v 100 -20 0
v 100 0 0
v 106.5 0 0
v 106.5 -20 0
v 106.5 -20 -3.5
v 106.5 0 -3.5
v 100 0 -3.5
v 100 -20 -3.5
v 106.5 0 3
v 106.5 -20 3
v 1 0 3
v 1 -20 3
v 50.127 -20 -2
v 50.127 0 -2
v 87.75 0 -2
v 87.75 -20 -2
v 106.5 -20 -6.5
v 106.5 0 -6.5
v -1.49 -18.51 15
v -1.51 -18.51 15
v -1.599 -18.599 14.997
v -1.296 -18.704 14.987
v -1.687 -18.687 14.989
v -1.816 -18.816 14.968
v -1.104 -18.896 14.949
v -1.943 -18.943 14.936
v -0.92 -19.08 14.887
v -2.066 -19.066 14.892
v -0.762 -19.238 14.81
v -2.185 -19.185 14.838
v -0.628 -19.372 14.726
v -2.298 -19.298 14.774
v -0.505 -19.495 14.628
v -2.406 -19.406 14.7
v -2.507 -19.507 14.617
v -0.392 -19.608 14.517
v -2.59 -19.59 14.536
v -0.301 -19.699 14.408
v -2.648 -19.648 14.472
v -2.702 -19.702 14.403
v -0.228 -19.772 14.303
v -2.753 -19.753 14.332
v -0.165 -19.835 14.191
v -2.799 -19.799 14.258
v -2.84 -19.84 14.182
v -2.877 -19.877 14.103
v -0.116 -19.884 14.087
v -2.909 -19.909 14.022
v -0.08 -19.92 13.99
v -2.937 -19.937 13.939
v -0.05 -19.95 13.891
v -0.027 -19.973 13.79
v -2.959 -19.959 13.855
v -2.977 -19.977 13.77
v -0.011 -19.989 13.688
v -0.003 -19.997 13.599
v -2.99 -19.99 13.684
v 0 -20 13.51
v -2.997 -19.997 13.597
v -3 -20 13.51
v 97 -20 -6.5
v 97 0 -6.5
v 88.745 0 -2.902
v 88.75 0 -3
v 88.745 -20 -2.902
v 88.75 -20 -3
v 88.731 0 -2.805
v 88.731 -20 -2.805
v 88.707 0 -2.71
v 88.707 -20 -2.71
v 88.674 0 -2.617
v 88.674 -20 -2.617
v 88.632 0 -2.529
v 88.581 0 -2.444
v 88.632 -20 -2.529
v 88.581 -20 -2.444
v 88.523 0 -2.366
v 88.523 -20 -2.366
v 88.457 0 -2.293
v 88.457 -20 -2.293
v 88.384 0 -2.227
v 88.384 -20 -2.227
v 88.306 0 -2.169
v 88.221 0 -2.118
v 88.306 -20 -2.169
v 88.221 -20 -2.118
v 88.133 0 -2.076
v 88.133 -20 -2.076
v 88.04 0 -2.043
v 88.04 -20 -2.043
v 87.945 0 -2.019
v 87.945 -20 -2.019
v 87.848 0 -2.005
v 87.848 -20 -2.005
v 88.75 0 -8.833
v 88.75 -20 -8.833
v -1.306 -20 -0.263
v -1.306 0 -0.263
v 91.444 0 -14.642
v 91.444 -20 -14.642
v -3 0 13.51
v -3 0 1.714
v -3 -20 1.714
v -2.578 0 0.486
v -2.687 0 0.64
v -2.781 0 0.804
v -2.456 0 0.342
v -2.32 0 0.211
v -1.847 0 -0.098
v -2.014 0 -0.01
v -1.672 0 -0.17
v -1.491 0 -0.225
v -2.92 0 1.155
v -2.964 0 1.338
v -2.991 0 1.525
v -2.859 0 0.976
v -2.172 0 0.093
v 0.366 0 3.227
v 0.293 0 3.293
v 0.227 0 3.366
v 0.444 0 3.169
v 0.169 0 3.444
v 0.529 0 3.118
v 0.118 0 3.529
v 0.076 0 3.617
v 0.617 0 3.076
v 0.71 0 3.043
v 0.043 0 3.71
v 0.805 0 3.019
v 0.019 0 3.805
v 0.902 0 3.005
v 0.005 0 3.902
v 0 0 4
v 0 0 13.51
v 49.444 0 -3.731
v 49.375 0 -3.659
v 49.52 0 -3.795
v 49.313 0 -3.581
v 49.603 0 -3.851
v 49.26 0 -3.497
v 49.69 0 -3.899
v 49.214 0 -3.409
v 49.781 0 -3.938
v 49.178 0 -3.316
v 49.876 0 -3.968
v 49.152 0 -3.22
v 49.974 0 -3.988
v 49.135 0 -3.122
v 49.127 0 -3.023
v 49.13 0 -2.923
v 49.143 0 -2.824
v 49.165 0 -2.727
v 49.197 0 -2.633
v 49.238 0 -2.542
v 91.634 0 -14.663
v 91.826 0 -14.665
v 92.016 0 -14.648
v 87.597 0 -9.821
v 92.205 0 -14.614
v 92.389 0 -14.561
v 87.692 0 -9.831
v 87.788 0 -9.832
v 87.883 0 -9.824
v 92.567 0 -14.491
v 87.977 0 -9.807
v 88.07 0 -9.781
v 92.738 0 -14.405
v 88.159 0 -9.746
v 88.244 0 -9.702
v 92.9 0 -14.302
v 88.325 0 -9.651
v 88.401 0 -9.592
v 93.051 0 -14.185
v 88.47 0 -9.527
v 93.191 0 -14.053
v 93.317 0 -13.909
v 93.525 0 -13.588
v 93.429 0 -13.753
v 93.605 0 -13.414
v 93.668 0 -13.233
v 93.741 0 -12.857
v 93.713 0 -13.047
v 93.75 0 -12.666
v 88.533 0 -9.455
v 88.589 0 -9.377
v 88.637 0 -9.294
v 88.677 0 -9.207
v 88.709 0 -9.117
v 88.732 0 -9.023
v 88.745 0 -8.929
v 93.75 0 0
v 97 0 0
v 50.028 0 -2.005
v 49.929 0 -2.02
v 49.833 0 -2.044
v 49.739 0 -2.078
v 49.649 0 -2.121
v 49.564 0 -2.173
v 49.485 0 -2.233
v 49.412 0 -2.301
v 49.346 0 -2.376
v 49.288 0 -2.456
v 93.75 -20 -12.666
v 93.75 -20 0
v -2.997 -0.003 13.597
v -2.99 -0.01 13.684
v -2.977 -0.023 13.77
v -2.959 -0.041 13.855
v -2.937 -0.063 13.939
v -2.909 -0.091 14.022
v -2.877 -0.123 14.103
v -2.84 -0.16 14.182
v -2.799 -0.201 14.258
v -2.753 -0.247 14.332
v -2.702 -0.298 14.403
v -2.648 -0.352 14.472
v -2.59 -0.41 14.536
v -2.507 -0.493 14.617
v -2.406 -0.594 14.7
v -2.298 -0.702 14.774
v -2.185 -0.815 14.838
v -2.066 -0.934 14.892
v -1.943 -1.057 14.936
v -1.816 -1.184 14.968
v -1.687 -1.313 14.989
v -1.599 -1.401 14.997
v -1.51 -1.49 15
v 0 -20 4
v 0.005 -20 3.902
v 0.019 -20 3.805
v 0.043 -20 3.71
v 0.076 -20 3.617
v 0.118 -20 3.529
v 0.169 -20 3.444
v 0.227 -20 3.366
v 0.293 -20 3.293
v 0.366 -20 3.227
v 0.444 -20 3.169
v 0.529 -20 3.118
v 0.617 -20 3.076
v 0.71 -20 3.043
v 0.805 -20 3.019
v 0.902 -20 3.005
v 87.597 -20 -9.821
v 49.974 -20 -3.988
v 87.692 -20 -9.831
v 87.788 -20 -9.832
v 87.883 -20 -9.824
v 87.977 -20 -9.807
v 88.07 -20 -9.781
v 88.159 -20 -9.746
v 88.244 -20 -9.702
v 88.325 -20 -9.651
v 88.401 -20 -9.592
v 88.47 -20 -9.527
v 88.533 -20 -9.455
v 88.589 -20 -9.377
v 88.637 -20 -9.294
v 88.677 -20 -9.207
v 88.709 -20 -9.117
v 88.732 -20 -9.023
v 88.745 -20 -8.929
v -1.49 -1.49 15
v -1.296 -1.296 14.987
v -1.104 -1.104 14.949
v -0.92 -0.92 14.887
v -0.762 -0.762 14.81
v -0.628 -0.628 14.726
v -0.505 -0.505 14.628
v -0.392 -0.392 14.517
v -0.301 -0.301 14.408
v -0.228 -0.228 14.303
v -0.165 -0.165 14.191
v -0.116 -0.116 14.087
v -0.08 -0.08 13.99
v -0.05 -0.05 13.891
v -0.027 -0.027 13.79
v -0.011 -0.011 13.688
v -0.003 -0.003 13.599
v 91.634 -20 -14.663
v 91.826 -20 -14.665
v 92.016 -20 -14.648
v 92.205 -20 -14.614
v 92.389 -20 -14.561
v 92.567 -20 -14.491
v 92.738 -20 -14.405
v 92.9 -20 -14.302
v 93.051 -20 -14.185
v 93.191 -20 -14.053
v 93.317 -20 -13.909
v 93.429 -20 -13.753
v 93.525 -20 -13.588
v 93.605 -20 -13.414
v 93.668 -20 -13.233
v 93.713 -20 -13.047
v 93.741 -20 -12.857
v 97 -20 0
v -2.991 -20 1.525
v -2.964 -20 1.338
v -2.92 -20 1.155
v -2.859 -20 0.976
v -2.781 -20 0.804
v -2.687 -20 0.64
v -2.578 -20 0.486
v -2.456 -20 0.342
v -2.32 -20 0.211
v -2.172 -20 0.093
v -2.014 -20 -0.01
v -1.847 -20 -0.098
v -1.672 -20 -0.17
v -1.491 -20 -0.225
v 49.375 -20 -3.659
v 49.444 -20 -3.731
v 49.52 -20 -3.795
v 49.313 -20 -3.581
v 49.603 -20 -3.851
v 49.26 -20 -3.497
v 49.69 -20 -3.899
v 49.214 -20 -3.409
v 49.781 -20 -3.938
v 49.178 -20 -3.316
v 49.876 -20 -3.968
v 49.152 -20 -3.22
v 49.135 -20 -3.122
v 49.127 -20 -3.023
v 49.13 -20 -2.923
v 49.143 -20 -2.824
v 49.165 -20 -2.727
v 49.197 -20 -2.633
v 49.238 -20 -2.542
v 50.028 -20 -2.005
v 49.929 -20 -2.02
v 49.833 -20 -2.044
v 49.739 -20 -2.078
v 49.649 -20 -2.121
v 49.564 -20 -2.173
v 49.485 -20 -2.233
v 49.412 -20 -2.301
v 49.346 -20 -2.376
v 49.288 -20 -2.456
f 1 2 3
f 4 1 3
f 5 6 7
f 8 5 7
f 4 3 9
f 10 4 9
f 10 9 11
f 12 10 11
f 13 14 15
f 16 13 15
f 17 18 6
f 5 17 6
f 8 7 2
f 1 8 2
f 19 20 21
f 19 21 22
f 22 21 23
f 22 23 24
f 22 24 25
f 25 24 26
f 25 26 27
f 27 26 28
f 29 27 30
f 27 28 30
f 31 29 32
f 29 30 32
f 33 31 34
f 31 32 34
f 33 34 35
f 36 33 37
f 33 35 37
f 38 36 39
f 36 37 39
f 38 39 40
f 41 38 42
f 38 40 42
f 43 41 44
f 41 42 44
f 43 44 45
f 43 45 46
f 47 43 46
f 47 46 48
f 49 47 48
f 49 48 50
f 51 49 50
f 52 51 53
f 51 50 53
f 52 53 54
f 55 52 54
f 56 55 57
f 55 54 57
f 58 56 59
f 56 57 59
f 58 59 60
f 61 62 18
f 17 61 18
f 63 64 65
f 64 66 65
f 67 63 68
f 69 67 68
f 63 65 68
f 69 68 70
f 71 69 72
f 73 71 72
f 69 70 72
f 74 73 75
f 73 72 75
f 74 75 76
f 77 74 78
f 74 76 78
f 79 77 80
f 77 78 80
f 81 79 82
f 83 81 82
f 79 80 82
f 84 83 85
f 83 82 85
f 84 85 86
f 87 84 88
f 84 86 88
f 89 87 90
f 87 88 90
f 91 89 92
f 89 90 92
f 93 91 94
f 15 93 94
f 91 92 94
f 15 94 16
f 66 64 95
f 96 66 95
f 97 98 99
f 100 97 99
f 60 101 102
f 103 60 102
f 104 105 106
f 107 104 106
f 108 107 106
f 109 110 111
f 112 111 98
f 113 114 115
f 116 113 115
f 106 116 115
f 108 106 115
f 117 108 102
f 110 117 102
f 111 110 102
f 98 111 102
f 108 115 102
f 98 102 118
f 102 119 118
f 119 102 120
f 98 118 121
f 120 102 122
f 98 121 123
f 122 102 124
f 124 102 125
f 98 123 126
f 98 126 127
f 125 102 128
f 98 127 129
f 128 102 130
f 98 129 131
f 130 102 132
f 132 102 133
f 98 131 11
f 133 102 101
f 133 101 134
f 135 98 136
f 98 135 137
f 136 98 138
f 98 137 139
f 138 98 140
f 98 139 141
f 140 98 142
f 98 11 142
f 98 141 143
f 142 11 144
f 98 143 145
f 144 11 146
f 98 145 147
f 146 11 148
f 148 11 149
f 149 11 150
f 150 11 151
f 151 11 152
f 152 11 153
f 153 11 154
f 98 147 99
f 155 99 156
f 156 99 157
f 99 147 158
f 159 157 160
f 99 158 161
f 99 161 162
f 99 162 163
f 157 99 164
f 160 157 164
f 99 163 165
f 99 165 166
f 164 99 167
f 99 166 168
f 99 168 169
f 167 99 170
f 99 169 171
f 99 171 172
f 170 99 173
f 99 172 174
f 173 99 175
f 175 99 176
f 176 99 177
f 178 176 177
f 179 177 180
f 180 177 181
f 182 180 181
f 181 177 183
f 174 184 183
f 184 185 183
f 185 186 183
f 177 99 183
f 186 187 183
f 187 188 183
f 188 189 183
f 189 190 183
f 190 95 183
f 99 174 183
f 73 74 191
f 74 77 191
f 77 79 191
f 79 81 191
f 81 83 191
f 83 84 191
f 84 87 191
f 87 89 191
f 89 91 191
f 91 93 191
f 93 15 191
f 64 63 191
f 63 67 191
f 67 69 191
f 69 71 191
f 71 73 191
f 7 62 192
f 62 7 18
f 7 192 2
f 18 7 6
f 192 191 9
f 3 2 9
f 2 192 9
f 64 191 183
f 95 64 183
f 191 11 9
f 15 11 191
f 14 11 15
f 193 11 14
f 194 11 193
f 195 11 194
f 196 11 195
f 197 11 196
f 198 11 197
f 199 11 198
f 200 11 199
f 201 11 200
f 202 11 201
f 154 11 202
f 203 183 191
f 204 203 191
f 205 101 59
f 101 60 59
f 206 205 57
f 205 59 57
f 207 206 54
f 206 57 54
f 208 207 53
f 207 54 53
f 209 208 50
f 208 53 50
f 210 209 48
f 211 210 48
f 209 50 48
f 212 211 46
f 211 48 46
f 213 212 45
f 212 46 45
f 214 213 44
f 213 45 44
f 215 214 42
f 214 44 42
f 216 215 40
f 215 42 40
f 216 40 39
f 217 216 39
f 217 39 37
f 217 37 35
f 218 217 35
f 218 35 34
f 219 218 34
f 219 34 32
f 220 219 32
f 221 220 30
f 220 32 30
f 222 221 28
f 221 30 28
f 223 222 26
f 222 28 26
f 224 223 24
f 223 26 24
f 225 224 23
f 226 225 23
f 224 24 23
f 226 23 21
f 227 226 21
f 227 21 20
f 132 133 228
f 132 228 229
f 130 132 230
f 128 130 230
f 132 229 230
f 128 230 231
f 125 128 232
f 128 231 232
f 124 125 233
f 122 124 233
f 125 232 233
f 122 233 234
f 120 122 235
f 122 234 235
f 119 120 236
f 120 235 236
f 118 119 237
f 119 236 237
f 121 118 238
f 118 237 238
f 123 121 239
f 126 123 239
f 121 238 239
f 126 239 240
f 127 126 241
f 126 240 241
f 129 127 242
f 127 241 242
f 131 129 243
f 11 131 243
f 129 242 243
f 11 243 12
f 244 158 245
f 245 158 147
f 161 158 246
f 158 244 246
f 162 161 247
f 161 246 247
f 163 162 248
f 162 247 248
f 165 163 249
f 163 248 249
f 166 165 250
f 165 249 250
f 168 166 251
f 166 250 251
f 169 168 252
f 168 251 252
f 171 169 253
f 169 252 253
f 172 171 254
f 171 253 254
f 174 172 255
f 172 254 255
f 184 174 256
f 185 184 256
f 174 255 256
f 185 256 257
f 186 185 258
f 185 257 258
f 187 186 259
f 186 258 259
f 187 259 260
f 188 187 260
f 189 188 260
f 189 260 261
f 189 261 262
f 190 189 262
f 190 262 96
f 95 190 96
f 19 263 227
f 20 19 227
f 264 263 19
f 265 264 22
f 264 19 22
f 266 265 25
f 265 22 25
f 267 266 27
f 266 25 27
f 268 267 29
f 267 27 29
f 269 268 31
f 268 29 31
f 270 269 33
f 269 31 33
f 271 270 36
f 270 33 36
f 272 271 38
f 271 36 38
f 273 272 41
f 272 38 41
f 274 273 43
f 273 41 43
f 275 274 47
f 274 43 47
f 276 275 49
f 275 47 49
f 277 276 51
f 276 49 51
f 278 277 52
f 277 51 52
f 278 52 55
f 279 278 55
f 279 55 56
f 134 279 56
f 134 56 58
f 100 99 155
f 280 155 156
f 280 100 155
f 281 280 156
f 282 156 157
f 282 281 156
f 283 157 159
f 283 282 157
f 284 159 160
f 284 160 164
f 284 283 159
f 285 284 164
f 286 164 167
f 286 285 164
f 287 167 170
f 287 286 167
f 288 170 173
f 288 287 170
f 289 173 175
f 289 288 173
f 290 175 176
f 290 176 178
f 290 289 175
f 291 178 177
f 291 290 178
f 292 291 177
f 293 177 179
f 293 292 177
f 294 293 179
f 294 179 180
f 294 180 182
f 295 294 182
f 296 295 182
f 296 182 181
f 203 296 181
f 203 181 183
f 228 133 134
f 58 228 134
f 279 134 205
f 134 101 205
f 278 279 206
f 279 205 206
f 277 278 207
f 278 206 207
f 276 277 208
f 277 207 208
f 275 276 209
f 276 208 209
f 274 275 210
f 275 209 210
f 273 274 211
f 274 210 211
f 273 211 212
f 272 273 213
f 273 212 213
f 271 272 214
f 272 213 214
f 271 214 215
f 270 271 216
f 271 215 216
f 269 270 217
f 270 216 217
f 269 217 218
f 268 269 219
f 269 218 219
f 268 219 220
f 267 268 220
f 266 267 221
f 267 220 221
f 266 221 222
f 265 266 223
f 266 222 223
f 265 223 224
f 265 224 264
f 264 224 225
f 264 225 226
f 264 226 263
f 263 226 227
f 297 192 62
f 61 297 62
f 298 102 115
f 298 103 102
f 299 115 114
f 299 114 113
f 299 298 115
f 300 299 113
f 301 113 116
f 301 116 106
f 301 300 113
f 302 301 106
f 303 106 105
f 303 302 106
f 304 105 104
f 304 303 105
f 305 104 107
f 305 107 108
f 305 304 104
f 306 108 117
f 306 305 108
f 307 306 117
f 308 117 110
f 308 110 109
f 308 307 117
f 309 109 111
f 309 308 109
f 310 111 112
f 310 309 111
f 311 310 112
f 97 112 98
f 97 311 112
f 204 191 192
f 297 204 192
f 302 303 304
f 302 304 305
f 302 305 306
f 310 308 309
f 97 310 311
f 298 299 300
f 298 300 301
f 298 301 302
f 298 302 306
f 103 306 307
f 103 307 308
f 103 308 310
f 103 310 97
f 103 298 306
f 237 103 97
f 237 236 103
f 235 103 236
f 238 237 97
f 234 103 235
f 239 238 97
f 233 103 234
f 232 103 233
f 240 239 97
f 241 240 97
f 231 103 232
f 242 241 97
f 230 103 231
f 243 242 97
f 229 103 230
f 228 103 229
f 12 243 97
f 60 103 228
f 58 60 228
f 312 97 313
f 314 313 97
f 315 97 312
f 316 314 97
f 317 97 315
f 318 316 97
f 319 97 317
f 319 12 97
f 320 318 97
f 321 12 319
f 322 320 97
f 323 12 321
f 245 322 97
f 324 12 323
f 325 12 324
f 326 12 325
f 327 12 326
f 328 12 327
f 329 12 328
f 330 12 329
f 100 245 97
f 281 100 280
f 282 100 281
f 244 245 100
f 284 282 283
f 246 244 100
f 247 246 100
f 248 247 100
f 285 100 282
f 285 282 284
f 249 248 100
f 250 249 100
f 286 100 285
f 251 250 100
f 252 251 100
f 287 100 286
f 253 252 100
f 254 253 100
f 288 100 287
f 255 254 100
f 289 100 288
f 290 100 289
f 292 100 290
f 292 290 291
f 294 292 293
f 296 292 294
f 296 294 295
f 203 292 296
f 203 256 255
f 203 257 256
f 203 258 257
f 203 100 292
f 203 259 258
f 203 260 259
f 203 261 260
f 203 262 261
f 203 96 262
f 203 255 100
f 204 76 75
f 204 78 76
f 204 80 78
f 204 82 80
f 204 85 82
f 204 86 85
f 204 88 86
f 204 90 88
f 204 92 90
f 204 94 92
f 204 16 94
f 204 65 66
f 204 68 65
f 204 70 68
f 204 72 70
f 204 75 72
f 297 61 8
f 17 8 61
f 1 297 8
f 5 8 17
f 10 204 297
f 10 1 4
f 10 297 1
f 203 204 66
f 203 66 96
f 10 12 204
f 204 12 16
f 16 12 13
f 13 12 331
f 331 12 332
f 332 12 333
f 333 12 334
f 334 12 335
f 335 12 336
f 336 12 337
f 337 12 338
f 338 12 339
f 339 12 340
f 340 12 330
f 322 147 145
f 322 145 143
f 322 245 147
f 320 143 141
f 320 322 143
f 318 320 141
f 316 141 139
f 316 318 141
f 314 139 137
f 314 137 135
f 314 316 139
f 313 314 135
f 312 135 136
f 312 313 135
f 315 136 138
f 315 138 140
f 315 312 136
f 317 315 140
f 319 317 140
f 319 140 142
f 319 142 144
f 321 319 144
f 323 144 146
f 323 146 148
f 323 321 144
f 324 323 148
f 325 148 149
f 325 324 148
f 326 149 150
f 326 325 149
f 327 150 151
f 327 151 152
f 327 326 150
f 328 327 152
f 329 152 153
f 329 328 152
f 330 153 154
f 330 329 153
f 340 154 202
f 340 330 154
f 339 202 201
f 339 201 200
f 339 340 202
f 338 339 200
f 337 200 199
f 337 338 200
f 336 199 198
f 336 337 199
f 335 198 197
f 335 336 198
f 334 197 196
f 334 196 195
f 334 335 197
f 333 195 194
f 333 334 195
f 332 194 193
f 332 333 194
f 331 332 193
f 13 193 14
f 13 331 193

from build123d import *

# Parameters (mm, degrees)
PAD_DEPTH   = 20
FILLET_R    = 2
FILLET001_R = 1.49
FILLET002_R = 1
FILLET003_R = 1


with BuildPart() as part:
    # Sketch → Pad (new body)
    with BuildSketch(Plane.XZ):
        Polygon((0, 15), (-3, 15), (-3, 0), (93.75, -15), (93.75, 0), (97, 0), (97, -6.5), (106.5, -6.5), (106.5, -3.5), (100, -3.5), (100, 0), (106.5, 0), (106.5, 3), (0, 3), align=None)
        Polygon((37.15, -2), (88.75, -2), (88.75, -10), align=None, mode=Mode.SUBTRACT)
    extrude(amount=PAD_DEPTH)

    # Fillet
    fillet_edges = [part.edges().sort_by_distance(p)[0] for p in [
        (-3, -10, 0),
        (93.75, -10, -15),
    ]]
    fillet(fillet_edges, radius=FILLET_R)

    # Fillet001
    fillet001_edges = [part.edges().sort_by_distance(p)[0] for p in [
        (0, -10, 15),
        (-3, -10, 15),
        (-1.5, 0, 15),
        (-1.5, -20, 15),
    ]]
    fillet(fillet001_edges, radius=FILLET001_R)

    # Fillet002
    fillet002_edges = [part.edges().sort_by_distance(p)[0] for p in [
        (37.15, -10, -2),
        (88.75, -10, -2),
        (88.75, -10, -10),
    ]]
    fillet(fillet002_edges, radius=FILLET002_R)

    # Fillet003
    fillet003_edges = [part.edges().sort_by_distance(p)[0] for p in [
        (0, -10, 3),
    ]]
    fillet(fillet003_edges, radius=FILLET003_R)


solid = part.part
